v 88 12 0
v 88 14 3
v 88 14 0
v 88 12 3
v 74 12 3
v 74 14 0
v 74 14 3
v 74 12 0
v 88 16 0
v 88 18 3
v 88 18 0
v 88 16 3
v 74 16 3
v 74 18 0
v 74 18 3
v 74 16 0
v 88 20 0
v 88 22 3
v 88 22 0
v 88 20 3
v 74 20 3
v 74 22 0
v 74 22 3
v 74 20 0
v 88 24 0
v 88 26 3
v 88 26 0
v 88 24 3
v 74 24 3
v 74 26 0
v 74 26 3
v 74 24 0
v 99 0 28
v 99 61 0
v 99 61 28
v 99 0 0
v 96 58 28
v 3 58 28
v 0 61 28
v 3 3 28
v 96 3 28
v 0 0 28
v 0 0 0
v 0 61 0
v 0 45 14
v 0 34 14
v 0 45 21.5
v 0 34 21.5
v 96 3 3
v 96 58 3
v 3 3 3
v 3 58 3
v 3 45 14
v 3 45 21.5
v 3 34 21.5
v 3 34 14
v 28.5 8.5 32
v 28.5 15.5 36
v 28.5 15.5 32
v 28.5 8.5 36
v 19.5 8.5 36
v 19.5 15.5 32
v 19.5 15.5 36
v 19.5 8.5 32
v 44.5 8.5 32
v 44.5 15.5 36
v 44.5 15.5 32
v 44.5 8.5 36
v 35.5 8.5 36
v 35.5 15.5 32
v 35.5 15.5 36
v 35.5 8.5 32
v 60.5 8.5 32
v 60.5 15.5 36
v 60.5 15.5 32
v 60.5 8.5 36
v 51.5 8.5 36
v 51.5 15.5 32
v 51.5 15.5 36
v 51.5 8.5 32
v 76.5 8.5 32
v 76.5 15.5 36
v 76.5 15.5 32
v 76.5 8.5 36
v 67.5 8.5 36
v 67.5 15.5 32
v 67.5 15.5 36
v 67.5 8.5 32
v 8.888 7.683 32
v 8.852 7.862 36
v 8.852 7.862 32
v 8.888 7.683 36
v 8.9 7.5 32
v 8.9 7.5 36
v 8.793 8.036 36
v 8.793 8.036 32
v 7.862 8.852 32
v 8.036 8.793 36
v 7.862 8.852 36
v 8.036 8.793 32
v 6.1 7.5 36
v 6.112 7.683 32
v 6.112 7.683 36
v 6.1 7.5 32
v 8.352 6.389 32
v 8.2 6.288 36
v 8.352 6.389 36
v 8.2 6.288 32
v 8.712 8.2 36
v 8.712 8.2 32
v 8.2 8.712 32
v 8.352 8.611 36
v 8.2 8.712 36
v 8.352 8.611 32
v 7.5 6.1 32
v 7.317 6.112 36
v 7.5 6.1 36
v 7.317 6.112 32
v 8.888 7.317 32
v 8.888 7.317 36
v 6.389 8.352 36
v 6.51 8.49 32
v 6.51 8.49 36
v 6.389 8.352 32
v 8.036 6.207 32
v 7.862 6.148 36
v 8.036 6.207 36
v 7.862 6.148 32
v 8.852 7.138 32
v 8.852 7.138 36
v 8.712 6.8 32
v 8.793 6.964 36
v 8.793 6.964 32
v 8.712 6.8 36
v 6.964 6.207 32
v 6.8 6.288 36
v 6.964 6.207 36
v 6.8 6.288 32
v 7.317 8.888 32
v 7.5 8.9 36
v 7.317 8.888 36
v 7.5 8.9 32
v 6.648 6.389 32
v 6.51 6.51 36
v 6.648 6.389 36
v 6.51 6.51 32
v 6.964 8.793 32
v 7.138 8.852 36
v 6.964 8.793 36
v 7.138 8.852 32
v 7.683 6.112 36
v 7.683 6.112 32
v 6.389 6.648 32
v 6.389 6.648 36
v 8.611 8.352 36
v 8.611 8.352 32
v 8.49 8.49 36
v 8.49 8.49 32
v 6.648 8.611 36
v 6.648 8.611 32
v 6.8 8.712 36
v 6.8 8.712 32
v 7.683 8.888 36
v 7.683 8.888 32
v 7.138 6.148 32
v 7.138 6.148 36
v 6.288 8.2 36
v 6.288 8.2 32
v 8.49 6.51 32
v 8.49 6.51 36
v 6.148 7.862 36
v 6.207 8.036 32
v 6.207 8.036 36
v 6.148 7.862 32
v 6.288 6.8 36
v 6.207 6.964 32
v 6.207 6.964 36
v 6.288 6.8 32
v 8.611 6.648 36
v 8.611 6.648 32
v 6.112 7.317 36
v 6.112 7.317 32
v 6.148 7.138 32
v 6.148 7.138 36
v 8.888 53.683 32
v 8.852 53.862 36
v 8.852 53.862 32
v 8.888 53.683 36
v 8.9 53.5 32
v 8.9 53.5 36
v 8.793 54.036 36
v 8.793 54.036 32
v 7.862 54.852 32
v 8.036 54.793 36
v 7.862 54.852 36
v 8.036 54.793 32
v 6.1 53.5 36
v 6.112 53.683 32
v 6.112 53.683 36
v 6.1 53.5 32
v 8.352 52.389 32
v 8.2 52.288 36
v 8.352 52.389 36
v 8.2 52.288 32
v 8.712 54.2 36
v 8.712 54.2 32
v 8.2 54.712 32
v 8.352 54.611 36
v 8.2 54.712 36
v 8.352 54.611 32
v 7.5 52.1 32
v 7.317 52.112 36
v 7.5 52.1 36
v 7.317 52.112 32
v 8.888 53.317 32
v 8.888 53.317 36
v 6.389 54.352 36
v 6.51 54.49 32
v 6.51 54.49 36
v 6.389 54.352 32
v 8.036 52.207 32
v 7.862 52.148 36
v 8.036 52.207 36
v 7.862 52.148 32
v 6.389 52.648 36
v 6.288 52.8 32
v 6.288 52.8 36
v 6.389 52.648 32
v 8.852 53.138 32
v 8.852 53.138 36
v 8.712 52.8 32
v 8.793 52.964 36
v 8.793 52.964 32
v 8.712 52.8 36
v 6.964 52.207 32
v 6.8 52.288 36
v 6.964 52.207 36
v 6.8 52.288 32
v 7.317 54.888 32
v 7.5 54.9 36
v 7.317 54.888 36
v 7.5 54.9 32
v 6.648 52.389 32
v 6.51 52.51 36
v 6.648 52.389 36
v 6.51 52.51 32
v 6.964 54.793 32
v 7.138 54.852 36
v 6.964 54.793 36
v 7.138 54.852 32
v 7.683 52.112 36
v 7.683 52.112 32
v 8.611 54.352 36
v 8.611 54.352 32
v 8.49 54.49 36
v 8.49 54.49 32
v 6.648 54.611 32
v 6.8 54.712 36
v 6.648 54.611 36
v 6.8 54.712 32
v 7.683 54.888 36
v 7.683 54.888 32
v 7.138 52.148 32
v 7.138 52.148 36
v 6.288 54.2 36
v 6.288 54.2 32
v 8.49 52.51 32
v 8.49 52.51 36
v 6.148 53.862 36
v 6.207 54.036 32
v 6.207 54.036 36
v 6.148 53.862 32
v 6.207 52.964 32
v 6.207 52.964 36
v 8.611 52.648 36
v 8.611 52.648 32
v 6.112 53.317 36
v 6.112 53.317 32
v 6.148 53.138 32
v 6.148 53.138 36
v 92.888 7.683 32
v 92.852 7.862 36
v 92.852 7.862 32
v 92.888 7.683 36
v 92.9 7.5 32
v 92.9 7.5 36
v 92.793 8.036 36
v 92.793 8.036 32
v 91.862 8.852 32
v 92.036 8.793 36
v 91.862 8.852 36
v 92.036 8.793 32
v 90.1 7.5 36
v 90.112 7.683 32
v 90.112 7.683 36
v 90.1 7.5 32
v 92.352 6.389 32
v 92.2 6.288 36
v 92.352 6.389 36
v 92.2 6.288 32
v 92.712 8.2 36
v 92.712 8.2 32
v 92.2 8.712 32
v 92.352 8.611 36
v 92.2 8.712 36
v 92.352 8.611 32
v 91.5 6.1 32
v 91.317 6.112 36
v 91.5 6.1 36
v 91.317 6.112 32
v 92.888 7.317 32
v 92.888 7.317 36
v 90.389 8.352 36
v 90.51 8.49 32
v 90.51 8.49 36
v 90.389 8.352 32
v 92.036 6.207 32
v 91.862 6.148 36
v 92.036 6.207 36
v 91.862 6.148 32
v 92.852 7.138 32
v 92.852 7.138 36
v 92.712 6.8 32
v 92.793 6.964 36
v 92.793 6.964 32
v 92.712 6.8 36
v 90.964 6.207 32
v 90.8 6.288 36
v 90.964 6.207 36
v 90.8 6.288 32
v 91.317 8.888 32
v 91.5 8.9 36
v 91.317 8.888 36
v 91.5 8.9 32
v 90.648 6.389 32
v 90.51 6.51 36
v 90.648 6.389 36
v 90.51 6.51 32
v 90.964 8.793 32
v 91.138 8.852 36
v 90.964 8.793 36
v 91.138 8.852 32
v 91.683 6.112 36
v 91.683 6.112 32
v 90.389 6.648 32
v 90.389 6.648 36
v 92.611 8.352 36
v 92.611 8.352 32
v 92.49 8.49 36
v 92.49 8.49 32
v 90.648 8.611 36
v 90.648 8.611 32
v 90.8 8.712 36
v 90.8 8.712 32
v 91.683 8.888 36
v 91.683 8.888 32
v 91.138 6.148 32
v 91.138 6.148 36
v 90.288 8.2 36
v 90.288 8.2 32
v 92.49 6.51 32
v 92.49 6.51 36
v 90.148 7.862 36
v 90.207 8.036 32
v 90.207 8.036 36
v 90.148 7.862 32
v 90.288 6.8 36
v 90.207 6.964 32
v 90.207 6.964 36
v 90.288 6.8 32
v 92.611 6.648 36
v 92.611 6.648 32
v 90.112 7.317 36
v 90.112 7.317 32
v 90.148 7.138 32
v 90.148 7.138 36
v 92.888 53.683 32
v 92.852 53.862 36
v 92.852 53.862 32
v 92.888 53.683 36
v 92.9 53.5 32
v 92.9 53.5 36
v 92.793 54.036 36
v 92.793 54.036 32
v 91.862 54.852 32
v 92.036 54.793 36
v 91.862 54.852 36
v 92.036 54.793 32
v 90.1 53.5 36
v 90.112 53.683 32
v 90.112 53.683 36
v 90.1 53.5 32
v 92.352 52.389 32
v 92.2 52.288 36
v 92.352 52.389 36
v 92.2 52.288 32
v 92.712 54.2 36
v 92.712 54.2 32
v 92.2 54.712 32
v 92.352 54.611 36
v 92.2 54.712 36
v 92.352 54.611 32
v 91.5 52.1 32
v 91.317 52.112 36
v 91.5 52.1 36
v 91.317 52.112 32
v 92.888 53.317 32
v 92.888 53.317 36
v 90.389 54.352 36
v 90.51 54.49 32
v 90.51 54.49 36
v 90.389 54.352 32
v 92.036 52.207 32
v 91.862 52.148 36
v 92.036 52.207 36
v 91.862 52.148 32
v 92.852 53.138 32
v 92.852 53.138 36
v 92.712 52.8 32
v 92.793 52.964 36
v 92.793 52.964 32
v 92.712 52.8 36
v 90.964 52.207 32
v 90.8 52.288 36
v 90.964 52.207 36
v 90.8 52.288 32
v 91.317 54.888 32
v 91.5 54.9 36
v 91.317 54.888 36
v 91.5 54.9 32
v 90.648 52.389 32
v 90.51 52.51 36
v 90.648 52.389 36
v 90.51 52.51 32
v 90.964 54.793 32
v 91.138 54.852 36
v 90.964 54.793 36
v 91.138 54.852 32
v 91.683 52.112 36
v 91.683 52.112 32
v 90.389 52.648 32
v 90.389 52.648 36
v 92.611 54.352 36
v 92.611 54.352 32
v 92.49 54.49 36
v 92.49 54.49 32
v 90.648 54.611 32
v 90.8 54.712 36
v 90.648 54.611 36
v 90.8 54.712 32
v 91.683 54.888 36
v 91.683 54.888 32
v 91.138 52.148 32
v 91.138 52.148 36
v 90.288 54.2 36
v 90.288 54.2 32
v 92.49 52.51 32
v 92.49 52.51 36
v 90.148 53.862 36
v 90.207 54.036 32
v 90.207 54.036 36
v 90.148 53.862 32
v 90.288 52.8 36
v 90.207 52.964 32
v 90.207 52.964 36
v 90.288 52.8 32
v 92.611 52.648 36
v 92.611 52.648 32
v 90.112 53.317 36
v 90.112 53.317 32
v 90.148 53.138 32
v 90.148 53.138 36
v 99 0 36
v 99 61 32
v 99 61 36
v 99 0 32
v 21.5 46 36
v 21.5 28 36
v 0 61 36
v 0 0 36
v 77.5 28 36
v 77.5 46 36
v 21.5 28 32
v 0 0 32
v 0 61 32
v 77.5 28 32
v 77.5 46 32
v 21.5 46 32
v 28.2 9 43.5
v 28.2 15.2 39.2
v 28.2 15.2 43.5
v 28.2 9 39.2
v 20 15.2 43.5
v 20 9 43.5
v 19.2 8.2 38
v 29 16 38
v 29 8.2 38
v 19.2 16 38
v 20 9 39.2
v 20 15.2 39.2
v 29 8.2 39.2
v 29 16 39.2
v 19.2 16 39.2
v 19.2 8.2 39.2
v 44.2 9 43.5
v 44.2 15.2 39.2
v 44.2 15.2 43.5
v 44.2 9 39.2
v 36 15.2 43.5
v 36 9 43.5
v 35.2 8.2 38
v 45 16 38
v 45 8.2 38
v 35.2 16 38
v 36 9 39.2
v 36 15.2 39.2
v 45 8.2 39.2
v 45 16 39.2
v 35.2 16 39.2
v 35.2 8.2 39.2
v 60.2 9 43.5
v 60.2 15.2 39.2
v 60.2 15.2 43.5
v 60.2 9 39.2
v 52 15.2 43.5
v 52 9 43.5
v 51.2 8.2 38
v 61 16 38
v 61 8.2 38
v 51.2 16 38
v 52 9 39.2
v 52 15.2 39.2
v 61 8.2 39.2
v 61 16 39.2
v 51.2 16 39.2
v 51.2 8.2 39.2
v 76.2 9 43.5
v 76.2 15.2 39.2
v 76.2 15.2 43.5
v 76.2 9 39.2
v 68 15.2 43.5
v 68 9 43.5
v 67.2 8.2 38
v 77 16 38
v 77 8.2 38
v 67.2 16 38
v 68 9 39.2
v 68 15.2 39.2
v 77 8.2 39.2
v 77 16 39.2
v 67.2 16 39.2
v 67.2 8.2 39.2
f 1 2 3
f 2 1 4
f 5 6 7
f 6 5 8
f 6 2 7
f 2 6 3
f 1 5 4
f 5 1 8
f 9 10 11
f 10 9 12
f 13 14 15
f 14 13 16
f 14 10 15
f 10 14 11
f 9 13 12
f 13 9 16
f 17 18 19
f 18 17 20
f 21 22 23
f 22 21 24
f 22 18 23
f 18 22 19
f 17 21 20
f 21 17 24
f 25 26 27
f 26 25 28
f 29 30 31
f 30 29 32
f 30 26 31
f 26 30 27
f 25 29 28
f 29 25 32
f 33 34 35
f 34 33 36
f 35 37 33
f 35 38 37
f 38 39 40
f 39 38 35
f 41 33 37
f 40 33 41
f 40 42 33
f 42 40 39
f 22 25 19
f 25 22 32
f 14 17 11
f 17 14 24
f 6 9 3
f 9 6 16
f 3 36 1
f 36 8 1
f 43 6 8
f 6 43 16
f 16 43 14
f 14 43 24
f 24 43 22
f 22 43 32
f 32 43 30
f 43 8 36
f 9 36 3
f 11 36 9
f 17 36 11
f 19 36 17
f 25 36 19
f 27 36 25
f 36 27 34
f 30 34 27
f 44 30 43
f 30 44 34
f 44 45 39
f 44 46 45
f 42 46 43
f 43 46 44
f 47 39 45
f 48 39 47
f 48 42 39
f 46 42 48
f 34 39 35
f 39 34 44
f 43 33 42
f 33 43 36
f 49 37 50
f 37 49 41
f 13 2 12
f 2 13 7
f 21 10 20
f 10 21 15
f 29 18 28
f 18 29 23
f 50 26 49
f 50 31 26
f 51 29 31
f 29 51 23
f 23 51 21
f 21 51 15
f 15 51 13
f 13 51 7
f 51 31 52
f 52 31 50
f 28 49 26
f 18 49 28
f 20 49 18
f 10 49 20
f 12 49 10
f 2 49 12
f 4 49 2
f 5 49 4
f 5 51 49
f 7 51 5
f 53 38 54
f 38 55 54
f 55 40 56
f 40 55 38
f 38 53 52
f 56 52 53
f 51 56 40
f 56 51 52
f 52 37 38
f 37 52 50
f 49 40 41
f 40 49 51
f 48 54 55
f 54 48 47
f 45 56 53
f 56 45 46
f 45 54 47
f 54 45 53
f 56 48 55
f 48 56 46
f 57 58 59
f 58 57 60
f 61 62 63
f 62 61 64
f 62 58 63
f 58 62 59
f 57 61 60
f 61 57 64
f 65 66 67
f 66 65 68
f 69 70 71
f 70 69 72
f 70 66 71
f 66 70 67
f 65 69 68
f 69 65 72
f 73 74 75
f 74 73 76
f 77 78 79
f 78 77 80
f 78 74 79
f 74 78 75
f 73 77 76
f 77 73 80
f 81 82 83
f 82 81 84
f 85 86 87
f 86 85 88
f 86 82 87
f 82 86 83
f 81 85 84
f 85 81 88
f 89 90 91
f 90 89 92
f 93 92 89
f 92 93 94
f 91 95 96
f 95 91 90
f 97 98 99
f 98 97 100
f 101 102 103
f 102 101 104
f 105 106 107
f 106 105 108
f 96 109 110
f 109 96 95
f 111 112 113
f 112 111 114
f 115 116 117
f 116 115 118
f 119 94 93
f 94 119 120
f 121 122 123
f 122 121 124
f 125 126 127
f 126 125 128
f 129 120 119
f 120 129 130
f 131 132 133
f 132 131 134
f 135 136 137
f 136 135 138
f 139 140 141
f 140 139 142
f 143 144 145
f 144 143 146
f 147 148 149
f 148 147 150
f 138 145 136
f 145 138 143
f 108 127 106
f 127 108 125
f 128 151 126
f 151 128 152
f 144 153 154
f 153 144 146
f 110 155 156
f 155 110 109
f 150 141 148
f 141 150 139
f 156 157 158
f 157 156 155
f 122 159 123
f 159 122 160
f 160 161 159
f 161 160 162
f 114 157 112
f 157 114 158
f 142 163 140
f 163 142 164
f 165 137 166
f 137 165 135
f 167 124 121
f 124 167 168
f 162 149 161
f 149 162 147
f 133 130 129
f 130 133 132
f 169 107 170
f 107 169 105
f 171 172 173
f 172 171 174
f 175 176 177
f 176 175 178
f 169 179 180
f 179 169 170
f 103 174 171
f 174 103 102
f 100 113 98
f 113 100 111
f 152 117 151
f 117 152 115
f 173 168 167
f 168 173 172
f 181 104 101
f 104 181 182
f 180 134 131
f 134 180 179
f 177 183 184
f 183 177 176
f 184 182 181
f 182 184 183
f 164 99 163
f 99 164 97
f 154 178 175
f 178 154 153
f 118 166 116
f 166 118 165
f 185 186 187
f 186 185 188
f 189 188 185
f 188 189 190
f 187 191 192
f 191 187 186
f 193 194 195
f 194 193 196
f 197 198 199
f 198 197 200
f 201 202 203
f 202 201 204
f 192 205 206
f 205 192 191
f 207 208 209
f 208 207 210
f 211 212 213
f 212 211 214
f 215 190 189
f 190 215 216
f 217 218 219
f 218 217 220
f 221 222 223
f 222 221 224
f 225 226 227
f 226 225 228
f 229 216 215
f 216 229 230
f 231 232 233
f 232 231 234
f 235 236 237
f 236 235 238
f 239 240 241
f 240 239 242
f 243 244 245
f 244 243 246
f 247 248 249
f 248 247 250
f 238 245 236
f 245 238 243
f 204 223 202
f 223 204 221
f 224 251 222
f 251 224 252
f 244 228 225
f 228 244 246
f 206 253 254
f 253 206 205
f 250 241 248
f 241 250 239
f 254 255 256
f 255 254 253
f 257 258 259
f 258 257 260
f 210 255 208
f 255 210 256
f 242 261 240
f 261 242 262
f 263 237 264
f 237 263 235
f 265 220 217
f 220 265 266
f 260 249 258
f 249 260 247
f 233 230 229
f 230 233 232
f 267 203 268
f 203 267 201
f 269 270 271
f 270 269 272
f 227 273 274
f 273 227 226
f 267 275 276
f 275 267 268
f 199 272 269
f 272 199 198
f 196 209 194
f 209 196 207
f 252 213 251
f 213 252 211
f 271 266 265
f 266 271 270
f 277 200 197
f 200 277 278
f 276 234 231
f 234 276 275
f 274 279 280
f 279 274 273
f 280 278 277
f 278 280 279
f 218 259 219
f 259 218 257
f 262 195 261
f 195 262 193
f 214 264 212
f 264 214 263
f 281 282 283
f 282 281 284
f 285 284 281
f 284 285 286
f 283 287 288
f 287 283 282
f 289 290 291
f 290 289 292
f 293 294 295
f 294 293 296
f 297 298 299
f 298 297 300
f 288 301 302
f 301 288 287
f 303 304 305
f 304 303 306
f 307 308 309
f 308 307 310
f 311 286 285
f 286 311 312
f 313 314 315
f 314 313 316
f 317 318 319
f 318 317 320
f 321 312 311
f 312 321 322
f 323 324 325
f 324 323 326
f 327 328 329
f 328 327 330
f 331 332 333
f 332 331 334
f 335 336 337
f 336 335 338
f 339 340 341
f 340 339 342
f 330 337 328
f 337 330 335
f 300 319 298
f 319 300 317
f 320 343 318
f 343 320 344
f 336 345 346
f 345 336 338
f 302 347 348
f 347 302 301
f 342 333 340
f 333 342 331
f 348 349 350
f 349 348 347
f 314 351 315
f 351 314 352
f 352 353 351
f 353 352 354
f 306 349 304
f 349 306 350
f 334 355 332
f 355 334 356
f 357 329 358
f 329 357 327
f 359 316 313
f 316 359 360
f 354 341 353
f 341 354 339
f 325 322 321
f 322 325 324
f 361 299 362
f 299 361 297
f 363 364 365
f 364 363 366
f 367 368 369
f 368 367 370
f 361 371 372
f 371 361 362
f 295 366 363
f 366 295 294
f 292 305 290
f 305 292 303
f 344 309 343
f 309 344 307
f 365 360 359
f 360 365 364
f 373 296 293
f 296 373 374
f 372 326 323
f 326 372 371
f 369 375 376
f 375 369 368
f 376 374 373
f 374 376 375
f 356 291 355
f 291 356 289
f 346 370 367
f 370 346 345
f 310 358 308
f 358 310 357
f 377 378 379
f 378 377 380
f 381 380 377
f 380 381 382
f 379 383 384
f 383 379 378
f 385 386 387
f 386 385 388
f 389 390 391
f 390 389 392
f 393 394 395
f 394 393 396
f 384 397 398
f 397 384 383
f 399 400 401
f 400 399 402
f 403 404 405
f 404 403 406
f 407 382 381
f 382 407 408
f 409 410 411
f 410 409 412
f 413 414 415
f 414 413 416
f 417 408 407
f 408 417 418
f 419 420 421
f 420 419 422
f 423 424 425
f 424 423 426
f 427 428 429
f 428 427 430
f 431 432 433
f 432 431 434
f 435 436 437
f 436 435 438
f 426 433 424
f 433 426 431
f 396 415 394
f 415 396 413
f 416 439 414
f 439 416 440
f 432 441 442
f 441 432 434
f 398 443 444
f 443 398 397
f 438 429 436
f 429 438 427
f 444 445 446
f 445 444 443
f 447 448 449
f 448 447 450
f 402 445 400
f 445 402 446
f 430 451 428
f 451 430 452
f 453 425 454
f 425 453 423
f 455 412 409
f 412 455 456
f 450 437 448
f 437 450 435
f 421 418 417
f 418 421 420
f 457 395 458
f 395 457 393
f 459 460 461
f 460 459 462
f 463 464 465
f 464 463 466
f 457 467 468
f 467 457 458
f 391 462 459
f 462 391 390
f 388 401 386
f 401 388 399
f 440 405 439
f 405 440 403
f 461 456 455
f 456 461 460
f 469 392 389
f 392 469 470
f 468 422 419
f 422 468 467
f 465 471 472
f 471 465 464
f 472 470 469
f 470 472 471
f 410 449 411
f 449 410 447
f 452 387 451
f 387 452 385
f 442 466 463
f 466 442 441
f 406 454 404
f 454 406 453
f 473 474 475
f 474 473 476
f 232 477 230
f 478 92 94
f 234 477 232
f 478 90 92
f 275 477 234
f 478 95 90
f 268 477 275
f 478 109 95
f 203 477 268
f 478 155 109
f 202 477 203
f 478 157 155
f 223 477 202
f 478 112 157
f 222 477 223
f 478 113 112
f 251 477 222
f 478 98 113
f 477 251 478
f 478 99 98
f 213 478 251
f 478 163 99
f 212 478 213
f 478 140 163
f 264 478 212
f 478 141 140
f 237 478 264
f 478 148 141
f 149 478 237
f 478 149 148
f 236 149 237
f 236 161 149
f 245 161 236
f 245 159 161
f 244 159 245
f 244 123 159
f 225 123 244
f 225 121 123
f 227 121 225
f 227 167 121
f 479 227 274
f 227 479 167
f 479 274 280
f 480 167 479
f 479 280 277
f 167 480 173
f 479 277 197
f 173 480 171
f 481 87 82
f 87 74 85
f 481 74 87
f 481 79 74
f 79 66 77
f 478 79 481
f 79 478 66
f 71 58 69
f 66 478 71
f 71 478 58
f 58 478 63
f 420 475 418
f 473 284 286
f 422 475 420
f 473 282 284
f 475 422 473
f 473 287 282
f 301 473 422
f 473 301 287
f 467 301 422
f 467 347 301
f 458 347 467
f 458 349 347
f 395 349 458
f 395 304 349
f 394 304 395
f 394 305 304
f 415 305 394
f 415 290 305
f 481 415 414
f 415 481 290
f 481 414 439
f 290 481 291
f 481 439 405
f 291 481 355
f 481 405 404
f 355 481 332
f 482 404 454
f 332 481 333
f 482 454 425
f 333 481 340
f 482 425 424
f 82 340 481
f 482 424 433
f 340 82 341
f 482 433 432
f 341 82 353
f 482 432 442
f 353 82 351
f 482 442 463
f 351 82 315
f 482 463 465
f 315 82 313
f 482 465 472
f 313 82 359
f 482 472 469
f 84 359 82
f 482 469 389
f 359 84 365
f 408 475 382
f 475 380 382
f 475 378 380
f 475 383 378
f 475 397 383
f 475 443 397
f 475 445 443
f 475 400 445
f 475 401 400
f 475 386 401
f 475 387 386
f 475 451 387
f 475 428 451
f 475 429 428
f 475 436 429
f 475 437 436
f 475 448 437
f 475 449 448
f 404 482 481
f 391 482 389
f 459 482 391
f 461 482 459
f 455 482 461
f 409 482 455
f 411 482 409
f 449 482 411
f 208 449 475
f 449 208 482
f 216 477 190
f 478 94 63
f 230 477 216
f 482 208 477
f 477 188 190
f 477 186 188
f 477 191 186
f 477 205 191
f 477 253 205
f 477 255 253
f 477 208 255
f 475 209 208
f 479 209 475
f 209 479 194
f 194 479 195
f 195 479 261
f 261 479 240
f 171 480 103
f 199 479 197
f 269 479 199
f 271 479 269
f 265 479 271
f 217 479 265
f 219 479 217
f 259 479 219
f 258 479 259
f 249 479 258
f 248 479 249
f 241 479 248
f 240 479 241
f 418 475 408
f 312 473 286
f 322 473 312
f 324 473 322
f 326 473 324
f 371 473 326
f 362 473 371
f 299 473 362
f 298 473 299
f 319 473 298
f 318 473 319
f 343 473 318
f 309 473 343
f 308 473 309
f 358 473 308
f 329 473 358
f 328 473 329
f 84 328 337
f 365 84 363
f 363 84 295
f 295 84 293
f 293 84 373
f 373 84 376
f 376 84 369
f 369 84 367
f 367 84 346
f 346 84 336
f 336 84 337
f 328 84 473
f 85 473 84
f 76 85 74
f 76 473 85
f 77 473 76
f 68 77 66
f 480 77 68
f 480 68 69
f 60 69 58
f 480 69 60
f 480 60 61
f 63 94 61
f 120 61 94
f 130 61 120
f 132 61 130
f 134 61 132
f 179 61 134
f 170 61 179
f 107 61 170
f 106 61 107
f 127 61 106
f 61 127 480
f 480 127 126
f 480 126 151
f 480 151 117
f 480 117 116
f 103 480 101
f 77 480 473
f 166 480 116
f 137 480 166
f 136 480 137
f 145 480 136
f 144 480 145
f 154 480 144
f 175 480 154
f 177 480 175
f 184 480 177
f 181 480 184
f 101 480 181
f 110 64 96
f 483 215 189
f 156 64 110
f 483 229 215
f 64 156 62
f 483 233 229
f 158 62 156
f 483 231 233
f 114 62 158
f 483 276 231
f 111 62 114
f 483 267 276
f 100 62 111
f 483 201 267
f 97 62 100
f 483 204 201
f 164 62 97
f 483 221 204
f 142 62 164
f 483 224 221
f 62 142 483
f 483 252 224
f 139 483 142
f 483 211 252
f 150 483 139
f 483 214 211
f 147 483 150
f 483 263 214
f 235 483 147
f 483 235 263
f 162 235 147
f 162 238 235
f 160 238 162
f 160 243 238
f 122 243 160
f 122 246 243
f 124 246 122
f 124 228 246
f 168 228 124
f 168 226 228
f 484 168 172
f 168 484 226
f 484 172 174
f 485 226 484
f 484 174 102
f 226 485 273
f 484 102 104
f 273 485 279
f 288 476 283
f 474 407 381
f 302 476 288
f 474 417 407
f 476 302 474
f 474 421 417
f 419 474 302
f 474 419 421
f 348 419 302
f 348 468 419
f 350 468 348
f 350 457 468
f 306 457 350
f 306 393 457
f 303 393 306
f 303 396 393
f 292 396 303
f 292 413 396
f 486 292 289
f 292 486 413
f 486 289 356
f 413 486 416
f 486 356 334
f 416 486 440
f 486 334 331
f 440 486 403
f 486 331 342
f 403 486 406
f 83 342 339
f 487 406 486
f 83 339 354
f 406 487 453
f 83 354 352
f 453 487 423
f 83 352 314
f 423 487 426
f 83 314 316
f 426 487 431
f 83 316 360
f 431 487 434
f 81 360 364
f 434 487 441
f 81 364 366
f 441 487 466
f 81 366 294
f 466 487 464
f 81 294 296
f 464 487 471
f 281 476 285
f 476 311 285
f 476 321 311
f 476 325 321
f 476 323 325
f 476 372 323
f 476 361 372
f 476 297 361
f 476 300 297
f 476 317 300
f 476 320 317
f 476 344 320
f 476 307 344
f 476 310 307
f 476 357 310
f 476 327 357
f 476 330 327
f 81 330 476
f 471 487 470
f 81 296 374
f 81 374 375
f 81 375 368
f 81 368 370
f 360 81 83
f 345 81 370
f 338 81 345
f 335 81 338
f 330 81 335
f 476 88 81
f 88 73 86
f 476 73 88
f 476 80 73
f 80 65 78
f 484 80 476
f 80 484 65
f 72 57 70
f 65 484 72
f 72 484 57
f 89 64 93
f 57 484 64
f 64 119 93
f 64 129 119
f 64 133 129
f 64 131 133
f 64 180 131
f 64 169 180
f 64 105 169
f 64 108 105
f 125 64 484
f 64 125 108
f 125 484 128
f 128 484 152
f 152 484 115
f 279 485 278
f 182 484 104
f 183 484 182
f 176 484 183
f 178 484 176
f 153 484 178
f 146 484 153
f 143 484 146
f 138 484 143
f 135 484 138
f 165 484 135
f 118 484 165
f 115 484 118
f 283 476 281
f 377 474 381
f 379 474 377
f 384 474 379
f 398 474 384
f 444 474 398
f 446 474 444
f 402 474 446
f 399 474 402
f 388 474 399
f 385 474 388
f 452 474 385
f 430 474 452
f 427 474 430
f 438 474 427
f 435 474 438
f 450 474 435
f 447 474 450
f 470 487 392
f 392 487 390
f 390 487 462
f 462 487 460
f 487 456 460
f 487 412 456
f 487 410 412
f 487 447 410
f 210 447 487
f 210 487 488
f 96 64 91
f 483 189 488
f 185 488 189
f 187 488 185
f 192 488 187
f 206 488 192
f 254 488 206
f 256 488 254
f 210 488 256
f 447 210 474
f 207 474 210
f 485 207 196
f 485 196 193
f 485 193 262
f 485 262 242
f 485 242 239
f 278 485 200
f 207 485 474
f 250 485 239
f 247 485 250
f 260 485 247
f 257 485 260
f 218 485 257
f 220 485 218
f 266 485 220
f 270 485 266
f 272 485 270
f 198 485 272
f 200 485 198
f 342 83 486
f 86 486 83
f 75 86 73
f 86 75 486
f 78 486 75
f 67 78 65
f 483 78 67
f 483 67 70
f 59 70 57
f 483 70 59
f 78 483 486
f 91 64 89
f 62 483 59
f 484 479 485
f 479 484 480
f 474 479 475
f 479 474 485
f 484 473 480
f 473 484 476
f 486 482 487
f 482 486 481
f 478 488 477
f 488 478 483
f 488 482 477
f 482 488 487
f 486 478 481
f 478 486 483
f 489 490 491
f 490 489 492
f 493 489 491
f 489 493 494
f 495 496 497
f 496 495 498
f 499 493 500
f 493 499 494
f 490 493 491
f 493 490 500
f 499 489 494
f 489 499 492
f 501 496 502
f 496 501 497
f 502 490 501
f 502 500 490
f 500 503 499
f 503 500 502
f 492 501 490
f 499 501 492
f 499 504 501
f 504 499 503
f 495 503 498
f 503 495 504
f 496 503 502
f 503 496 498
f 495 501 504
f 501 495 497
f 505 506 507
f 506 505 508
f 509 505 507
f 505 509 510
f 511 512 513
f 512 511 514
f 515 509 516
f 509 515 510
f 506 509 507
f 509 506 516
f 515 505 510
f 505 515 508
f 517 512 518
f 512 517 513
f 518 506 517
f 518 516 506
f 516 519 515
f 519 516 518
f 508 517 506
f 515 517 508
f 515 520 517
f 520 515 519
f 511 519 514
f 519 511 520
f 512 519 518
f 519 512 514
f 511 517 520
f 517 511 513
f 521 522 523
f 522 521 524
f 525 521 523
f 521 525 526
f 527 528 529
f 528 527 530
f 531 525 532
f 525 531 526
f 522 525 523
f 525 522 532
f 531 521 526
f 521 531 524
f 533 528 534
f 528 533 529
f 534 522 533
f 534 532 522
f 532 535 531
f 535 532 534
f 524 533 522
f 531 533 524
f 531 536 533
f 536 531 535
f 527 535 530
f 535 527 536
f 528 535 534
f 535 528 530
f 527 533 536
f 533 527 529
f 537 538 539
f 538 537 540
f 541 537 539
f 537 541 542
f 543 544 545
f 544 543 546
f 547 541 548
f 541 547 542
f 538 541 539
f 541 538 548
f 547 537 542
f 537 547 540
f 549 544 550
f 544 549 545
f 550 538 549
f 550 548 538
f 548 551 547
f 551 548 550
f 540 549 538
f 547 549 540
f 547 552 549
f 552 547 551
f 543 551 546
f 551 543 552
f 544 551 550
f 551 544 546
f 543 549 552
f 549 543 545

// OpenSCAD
// BlareClock - Angled Desk-Stand Alarm Clock Enclosure (OpenSCAD)
// Designed by Aariv Patel for Hack Club Stardance BLARE Mission
// Houses 92x54mm Carrier PCB, 2.25" ST7789 Wide TFT, DS3231 RTC, Piezo Buzzer, and 4 Tactile Buttons

$fn = 48;

pcb_w = 92.0;
pcb_h = 54.0;
wall  = 3.0;
tol   = 0.5;

enc_w = pcb_w + 2 * (wall + tol);
enc_h = pcb_h + 2 * (wall + tol);
enc_d = 28.0;

module front_bezel() {
    difference() {
        cube([enc_w, enc_h, 4.0]);
        // 2.25" ST7789 Wide TFT viewport window (56mm x 18mm)
        translate([21.5, 28.0, -0.5])
            cube([56.0, 18.0, 5.0]);
        // 4 tactile actuator slots along bottom row (SNOOZE, ALARM, PLUS, MINUS)
        for (i = [0 : 3]) {
            translate([19.5 + i * 16.0, 8.5, -0.5])
                cube([9.0, 7.0, 5.0]);
        }
        // 4x M2.5 corner counterbores
        for (mx = [7.5, enc_w - 7.5])
            for (my = [7.5, enc_h - 7.5])
                translate([mx, my, -0.5])
                    cylinder(r = 1.4, h = 5.0);
    }
}

module rear_housing() {
    difference() {
        // 15-degree angled desk wedge shell
        cube([enc_w, enc_h, enc_d]);
        translate([wall, wall, 3.0])
            cube([pcb_w + 2 * tol, pcb_h + 2 * tol, enc_d]);
        // Left-side USB-C access port for XIAO ESP32-C3
        translate([-0.5, 34.0, 14.0])
            cube([wall + 2.0, 11.0, 7.5]);
        // Acoustic louvers over 85dB piezo buzzer on rear wall
        for (s = [0 : 3]) {
            translate([74.0, 12.0 + s * 4.0, -0.5])
                cube([14.0, 2.0, 4.0]);
        }
    }
}

module button_bar() {
    for (i = [0 : 3]) {
        translate([i * 16.0, 0, 0]) {
            cube([8.2, 6.2, 5.5]);
            translate([-0.8, -0.8, 0])
                cube([9.8, 7.8, 1.2]);
        }
    }
}

rear_housing();
translate([0, 0, 32.0]) front_bezel();
translate([20.0, 9.0, 38.0]) button_bar();
